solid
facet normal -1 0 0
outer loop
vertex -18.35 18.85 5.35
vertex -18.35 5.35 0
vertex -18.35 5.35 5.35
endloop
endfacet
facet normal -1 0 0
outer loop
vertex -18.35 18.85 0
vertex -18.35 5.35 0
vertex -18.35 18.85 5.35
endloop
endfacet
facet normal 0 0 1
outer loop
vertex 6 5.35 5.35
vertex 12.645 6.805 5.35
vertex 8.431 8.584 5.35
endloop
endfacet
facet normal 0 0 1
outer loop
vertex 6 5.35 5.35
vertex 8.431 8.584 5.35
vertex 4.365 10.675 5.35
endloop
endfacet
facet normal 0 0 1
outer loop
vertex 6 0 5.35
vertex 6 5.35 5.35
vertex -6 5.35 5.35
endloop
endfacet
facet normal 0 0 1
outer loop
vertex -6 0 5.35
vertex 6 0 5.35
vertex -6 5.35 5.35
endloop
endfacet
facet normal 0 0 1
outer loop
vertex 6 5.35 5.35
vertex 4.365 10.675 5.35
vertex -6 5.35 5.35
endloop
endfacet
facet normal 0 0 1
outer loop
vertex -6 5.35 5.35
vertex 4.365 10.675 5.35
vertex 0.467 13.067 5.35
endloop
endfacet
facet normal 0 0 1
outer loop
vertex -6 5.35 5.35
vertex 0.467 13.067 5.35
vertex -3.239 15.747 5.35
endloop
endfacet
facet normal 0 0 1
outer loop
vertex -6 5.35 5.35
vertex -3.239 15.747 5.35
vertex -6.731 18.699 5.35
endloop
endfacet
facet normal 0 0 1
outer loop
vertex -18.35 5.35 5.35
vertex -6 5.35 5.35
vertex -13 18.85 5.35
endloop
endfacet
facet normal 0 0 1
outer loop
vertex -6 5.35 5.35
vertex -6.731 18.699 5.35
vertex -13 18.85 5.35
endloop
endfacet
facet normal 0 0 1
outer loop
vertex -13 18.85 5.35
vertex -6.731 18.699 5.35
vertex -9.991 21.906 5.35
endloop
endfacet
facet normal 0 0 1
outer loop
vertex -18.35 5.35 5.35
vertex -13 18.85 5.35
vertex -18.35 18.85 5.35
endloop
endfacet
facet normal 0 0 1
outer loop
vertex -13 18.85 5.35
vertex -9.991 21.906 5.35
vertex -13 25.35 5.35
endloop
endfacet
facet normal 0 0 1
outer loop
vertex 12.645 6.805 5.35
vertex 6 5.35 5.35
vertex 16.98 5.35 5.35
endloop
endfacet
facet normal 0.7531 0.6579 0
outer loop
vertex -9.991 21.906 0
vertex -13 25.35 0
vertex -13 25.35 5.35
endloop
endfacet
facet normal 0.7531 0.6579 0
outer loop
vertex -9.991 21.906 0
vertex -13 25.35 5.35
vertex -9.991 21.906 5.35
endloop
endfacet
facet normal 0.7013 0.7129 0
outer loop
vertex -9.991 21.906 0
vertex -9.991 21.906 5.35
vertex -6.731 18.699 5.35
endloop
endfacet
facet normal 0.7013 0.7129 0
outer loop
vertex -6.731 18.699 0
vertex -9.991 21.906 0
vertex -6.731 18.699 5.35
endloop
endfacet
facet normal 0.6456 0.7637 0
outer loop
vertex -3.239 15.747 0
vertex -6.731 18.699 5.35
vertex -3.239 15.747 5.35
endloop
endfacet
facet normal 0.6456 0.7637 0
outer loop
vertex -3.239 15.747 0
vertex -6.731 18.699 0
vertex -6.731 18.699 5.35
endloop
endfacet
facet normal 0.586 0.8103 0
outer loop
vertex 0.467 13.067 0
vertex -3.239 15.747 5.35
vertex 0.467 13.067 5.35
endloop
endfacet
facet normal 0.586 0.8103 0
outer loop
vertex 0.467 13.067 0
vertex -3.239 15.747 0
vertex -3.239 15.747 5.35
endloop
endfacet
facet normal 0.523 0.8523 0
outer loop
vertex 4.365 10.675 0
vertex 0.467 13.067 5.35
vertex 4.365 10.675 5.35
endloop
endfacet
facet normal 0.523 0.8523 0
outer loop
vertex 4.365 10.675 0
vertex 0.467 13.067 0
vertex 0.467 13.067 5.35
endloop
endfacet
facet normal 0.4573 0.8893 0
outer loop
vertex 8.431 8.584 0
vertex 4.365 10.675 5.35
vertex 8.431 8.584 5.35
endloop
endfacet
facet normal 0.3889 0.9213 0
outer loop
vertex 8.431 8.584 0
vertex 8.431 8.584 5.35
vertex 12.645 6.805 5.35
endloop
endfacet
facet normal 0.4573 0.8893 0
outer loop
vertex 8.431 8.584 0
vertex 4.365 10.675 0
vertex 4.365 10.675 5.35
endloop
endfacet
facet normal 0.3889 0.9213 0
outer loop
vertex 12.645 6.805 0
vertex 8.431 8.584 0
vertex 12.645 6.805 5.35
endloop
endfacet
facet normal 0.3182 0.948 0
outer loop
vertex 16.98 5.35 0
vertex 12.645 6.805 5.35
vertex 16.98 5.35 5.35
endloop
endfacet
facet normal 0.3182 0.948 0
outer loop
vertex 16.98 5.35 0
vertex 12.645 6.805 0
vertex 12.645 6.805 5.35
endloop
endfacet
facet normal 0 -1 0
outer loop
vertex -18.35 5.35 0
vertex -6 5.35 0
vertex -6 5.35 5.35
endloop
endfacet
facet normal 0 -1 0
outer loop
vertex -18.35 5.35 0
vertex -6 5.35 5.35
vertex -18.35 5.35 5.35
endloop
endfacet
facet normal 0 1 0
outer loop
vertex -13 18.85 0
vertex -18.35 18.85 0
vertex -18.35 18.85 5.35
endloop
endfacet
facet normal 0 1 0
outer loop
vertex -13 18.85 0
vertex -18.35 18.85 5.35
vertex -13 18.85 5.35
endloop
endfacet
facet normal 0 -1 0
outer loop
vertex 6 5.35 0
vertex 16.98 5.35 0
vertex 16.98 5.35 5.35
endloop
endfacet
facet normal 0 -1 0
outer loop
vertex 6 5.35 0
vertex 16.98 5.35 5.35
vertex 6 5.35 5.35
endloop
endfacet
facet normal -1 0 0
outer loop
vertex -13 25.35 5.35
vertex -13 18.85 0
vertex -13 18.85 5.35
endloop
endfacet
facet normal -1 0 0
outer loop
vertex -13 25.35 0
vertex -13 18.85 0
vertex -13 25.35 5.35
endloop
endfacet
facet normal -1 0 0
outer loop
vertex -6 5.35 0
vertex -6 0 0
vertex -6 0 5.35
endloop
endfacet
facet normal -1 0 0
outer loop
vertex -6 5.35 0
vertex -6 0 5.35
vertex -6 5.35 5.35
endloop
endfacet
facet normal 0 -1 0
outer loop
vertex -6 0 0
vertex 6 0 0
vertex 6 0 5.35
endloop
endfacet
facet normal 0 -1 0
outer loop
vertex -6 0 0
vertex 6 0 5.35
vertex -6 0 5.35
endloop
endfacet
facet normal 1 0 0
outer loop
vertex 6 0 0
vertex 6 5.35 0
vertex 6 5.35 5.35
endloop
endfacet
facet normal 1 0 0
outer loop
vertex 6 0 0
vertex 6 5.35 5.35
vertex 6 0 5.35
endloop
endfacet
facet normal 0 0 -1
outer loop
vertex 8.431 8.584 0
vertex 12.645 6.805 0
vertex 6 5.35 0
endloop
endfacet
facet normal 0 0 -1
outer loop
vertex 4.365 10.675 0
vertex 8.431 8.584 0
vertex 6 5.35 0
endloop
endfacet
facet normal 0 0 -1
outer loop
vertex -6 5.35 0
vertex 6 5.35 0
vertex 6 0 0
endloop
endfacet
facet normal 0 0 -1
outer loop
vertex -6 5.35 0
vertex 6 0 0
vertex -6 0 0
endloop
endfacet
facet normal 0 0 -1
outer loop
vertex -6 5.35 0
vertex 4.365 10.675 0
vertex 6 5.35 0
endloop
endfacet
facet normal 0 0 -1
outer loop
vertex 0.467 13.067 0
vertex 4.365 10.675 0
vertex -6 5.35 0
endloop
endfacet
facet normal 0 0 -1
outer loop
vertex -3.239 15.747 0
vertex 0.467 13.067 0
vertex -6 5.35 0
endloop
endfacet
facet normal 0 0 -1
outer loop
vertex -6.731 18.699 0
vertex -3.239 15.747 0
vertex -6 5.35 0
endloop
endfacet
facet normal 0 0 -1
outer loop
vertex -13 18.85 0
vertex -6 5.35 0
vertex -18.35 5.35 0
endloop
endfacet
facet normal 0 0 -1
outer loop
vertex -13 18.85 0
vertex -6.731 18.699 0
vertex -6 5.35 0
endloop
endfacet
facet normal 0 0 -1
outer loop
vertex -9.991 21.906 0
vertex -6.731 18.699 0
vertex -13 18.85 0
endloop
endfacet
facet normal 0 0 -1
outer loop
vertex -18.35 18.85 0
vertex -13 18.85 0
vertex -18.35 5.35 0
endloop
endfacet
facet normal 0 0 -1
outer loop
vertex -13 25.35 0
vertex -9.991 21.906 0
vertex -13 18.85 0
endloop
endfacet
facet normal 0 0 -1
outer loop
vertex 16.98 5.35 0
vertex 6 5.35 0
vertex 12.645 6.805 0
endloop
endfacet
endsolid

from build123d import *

# Parameters (mm, degrees)
BOSS_EXTRUDE1_DEPTH = 5.35


with BuildPart() as part:
    # Model → Boss-Extrude1 (new body)
    with BuildSketch(Plane.XY):
        with BuildLine():
            ThreePointArc((-13, 25.35), (0.467134815, 13.067225088), (16.98, 5.35))
            Line((16.98, 5.35), (6, 5.35))
            Line((6, 5.35), (6, 0))
            Line((6, 0), (-6, 0))
            Line((-6, 0), (-6, 5.35))
            Line((-6, 5.35), (-18.35, 5.35))
            Line((-18.35, 5.35), (-18.35, 18.85))
            Line((-18.35, 18.85), (-13, 18.85))
            Line((-13, 18.85), (-13, 25.35))
        make_face()
    extrude(amount=BOSS_EXTRUDE1_DEPTH)


solid = part.part
